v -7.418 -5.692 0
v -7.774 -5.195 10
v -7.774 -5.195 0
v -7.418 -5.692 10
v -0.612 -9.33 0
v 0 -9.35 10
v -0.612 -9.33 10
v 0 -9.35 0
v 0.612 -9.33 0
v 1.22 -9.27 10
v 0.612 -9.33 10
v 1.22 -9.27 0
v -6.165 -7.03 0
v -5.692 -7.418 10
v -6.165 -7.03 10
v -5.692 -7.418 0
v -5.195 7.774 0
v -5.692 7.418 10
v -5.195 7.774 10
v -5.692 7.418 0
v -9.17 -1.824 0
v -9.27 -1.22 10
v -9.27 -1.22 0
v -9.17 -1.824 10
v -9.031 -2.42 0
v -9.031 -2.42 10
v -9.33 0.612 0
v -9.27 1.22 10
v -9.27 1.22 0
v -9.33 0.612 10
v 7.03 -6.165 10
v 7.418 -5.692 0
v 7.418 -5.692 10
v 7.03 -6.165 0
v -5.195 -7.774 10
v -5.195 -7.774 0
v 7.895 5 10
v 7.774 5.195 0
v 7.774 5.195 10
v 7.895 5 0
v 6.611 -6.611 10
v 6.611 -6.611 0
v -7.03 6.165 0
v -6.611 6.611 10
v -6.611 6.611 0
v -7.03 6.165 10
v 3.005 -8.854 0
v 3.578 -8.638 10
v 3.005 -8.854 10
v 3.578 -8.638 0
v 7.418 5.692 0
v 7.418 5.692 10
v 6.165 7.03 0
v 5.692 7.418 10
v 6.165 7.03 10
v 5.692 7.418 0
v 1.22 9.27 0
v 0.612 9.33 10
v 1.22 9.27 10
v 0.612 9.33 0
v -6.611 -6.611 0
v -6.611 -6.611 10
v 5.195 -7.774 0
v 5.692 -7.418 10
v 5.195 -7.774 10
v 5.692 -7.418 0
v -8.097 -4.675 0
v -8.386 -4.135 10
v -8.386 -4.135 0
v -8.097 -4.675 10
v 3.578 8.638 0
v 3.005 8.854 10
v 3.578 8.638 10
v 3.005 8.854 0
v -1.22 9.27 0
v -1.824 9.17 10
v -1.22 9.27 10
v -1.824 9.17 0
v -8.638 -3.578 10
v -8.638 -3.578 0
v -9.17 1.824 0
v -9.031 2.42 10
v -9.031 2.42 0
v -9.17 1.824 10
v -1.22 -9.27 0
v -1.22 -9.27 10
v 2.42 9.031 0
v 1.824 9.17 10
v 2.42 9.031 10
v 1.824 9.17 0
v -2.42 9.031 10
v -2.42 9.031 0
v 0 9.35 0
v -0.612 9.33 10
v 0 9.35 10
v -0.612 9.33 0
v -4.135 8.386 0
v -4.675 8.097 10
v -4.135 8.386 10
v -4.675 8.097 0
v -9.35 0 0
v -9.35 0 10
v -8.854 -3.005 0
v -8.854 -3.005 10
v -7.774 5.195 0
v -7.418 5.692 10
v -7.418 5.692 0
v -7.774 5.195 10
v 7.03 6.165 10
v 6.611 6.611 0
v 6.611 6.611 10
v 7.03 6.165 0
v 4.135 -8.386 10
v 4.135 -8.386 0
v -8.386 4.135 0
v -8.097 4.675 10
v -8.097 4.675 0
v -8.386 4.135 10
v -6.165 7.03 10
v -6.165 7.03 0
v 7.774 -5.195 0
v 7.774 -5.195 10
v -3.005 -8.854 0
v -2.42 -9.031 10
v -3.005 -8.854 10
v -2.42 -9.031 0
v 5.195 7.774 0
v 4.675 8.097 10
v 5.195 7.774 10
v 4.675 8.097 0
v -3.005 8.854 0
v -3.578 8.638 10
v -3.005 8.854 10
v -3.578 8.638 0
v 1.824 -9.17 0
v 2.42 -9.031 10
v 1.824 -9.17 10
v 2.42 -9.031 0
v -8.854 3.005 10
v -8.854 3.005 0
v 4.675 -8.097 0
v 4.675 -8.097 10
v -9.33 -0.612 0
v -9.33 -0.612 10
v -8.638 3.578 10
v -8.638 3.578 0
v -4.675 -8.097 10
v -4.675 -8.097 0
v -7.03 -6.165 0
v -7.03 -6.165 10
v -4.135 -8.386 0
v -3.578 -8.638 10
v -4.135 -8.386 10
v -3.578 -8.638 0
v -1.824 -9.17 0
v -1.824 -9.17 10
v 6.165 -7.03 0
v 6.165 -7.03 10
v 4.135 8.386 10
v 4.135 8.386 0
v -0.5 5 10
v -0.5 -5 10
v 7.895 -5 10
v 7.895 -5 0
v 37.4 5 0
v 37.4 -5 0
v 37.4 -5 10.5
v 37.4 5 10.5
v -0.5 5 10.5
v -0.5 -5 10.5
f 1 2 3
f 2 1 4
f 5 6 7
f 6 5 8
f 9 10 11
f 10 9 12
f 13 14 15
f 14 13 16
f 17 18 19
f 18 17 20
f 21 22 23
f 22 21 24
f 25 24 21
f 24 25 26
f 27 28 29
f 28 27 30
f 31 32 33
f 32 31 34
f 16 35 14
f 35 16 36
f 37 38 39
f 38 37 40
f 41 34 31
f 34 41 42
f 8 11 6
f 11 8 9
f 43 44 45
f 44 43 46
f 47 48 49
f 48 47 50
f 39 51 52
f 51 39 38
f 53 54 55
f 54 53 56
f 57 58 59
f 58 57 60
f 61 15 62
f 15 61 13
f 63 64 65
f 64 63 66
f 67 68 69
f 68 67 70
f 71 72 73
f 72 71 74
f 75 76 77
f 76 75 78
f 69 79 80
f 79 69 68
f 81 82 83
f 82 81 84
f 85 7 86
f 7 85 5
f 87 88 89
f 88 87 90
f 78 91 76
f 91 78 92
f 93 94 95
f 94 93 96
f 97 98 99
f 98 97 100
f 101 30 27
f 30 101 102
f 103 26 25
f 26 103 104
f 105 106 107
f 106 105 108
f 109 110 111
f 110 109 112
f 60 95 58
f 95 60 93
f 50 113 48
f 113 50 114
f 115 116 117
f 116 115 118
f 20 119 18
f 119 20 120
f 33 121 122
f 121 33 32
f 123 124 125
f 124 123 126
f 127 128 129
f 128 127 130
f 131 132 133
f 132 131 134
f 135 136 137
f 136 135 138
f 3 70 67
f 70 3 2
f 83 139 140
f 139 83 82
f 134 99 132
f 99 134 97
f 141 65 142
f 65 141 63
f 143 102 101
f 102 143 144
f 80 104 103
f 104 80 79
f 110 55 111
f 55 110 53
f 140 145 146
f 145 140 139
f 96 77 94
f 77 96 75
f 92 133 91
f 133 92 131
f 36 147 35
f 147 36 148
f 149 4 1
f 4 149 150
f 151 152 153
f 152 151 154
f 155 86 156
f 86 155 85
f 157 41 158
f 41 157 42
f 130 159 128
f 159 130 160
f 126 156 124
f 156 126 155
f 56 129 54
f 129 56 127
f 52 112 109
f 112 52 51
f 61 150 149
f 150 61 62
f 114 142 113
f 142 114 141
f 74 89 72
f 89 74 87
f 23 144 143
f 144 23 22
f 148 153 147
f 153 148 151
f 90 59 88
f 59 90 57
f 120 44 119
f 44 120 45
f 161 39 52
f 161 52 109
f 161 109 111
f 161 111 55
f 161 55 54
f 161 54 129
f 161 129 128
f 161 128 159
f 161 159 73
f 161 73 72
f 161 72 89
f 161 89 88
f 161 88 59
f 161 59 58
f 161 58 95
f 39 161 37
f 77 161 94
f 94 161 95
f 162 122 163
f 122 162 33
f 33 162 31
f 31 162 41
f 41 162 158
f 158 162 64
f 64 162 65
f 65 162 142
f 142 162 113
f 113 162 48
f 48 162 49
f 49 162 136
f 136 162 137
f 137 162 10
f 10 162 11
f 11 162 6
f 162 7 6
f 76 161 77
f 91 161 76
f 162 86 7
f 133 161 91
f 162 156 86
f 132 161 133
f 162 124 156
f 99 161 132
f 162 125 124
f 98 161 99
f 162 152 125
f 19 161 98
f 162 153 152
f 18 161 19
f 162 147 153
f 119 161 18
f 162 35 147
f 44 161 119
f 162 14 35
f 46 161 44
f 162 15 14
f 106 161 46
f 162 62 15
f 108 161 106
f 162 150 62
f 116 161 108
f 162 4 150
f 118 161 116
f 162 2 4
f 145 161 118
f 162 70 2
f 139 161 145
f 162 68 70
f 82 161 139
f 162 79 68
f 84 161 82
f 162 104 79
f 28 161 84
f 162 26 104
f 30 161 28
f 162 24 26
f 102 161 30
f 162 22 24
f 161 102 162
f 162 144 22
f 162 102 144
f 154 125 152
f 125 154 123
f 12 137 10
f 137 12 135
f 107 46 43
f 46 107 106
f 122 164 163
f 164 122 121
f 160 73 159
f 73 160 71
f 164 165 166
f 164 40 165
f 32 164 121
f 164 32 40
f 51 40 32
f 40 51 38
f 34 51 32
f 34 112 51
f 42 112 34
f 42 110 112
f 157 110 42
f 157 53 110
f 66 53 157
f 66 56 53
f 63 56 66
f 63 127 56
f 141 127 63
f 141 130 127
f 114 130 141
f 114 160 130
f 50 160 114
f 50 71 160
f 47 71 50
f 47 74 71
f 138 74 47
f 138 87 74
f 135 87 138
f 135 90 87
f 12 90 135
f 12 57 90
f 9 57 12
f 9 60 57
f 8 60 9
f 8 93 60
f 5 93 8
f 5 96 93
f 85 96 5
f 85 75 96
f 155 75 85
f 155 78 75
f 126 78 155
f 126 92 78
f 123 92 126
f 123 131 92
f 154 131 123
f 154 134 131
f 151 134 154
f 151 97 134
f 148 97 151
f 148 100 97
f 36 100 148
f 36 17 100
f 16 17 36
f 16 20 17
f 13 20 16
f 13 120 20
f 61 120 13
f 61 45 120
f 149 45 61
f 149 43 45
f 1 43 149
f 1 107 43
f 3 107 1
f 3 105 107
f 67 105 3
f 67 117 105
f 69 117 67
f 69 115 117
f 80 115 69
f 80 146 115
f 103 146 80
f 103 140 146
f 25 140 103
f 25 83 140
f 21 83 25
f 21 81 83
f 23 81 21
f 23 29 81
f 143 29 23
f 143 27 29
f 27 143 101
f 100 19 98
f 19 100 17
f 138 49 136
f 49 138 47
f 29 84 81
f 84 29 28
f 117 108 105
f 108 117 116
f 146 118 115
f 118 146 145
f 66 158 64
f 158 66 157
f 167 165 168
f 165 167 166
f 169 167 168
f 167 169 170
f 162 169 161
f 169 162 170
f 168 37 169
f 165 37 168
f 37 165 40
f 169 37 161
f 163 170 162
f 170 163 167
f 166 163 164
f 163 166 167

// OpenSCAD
// Snap-on clip for tubing next to a 12.7 mm lab stand rod
// Printed flat: extrusion in Z of a 2-D profile in XY

// ---------- Parameters ----------
rod_id        = 12.7;   // stand rod inner diameter
rod_wall      = 3;      // stand rod ring wall thickness
ring_open     = 10;     // stand rod ring opening width (along Y)
ring_open_x   = -0;     // stand rod ring opening centre X

tubing_id     = 6;      // tubing inner diameter
tubing_wall   = 2;      // tubing ring wall thickness
tubing_open   = 4.5;    // tubing ring opening width (along Y)
tubing_x      = 15;     // tubing ring centre X

bridge_w      = 6;      // bridge width (along Y)
bridge_x1     = 8;      // bridge start X
bridge_x2     = 12;     // bridge end X

eps           = 0.5;    // cutter overshoot past faces
$fn           = 96;     // curve resolution

// ---------- Derived ----------
rod_od    = rod_id + 2 * rod_wall;   // 18.7 mm
tubing_od = tubing_id + 2 * tubing_wall; // 10 mm

// ---------- Profile ----------
difference() {
    union() {
        // Stand rod ring
        translate([0, 0, 0])
            cylinder(d = rod_od, h = 10);
        // Stand rod ring opening (x < 0, -ring_open/2 < y < ring_open/2)
        translate([ring_open_x - eps, -ring_open / 2, 0])
            cube([eps + 2 * rod_od, ring_open, 10 + eps]);

        // Tubing ring
        translate([tubing_x, 0, 0])
            cylinder(d = tubing_od, h = 10);
        // Tubing ring opening (x > tubing_x, -tubing_open/2 < y < tubing_open/2)
        translate([tubing_x + eps, -tubing_open / 2, 0])
            cube([eps + 2 * tubing_od, tubing_open, 10 + eps]);

        // Solid bridge between x = 8 and x = 12
        translate([bridge_x1, -bridge_w / 2, 0])
            cube([bridge_x2 - bridge_x1 + eps, bridge_w, 10 + eps]);
    }
}
